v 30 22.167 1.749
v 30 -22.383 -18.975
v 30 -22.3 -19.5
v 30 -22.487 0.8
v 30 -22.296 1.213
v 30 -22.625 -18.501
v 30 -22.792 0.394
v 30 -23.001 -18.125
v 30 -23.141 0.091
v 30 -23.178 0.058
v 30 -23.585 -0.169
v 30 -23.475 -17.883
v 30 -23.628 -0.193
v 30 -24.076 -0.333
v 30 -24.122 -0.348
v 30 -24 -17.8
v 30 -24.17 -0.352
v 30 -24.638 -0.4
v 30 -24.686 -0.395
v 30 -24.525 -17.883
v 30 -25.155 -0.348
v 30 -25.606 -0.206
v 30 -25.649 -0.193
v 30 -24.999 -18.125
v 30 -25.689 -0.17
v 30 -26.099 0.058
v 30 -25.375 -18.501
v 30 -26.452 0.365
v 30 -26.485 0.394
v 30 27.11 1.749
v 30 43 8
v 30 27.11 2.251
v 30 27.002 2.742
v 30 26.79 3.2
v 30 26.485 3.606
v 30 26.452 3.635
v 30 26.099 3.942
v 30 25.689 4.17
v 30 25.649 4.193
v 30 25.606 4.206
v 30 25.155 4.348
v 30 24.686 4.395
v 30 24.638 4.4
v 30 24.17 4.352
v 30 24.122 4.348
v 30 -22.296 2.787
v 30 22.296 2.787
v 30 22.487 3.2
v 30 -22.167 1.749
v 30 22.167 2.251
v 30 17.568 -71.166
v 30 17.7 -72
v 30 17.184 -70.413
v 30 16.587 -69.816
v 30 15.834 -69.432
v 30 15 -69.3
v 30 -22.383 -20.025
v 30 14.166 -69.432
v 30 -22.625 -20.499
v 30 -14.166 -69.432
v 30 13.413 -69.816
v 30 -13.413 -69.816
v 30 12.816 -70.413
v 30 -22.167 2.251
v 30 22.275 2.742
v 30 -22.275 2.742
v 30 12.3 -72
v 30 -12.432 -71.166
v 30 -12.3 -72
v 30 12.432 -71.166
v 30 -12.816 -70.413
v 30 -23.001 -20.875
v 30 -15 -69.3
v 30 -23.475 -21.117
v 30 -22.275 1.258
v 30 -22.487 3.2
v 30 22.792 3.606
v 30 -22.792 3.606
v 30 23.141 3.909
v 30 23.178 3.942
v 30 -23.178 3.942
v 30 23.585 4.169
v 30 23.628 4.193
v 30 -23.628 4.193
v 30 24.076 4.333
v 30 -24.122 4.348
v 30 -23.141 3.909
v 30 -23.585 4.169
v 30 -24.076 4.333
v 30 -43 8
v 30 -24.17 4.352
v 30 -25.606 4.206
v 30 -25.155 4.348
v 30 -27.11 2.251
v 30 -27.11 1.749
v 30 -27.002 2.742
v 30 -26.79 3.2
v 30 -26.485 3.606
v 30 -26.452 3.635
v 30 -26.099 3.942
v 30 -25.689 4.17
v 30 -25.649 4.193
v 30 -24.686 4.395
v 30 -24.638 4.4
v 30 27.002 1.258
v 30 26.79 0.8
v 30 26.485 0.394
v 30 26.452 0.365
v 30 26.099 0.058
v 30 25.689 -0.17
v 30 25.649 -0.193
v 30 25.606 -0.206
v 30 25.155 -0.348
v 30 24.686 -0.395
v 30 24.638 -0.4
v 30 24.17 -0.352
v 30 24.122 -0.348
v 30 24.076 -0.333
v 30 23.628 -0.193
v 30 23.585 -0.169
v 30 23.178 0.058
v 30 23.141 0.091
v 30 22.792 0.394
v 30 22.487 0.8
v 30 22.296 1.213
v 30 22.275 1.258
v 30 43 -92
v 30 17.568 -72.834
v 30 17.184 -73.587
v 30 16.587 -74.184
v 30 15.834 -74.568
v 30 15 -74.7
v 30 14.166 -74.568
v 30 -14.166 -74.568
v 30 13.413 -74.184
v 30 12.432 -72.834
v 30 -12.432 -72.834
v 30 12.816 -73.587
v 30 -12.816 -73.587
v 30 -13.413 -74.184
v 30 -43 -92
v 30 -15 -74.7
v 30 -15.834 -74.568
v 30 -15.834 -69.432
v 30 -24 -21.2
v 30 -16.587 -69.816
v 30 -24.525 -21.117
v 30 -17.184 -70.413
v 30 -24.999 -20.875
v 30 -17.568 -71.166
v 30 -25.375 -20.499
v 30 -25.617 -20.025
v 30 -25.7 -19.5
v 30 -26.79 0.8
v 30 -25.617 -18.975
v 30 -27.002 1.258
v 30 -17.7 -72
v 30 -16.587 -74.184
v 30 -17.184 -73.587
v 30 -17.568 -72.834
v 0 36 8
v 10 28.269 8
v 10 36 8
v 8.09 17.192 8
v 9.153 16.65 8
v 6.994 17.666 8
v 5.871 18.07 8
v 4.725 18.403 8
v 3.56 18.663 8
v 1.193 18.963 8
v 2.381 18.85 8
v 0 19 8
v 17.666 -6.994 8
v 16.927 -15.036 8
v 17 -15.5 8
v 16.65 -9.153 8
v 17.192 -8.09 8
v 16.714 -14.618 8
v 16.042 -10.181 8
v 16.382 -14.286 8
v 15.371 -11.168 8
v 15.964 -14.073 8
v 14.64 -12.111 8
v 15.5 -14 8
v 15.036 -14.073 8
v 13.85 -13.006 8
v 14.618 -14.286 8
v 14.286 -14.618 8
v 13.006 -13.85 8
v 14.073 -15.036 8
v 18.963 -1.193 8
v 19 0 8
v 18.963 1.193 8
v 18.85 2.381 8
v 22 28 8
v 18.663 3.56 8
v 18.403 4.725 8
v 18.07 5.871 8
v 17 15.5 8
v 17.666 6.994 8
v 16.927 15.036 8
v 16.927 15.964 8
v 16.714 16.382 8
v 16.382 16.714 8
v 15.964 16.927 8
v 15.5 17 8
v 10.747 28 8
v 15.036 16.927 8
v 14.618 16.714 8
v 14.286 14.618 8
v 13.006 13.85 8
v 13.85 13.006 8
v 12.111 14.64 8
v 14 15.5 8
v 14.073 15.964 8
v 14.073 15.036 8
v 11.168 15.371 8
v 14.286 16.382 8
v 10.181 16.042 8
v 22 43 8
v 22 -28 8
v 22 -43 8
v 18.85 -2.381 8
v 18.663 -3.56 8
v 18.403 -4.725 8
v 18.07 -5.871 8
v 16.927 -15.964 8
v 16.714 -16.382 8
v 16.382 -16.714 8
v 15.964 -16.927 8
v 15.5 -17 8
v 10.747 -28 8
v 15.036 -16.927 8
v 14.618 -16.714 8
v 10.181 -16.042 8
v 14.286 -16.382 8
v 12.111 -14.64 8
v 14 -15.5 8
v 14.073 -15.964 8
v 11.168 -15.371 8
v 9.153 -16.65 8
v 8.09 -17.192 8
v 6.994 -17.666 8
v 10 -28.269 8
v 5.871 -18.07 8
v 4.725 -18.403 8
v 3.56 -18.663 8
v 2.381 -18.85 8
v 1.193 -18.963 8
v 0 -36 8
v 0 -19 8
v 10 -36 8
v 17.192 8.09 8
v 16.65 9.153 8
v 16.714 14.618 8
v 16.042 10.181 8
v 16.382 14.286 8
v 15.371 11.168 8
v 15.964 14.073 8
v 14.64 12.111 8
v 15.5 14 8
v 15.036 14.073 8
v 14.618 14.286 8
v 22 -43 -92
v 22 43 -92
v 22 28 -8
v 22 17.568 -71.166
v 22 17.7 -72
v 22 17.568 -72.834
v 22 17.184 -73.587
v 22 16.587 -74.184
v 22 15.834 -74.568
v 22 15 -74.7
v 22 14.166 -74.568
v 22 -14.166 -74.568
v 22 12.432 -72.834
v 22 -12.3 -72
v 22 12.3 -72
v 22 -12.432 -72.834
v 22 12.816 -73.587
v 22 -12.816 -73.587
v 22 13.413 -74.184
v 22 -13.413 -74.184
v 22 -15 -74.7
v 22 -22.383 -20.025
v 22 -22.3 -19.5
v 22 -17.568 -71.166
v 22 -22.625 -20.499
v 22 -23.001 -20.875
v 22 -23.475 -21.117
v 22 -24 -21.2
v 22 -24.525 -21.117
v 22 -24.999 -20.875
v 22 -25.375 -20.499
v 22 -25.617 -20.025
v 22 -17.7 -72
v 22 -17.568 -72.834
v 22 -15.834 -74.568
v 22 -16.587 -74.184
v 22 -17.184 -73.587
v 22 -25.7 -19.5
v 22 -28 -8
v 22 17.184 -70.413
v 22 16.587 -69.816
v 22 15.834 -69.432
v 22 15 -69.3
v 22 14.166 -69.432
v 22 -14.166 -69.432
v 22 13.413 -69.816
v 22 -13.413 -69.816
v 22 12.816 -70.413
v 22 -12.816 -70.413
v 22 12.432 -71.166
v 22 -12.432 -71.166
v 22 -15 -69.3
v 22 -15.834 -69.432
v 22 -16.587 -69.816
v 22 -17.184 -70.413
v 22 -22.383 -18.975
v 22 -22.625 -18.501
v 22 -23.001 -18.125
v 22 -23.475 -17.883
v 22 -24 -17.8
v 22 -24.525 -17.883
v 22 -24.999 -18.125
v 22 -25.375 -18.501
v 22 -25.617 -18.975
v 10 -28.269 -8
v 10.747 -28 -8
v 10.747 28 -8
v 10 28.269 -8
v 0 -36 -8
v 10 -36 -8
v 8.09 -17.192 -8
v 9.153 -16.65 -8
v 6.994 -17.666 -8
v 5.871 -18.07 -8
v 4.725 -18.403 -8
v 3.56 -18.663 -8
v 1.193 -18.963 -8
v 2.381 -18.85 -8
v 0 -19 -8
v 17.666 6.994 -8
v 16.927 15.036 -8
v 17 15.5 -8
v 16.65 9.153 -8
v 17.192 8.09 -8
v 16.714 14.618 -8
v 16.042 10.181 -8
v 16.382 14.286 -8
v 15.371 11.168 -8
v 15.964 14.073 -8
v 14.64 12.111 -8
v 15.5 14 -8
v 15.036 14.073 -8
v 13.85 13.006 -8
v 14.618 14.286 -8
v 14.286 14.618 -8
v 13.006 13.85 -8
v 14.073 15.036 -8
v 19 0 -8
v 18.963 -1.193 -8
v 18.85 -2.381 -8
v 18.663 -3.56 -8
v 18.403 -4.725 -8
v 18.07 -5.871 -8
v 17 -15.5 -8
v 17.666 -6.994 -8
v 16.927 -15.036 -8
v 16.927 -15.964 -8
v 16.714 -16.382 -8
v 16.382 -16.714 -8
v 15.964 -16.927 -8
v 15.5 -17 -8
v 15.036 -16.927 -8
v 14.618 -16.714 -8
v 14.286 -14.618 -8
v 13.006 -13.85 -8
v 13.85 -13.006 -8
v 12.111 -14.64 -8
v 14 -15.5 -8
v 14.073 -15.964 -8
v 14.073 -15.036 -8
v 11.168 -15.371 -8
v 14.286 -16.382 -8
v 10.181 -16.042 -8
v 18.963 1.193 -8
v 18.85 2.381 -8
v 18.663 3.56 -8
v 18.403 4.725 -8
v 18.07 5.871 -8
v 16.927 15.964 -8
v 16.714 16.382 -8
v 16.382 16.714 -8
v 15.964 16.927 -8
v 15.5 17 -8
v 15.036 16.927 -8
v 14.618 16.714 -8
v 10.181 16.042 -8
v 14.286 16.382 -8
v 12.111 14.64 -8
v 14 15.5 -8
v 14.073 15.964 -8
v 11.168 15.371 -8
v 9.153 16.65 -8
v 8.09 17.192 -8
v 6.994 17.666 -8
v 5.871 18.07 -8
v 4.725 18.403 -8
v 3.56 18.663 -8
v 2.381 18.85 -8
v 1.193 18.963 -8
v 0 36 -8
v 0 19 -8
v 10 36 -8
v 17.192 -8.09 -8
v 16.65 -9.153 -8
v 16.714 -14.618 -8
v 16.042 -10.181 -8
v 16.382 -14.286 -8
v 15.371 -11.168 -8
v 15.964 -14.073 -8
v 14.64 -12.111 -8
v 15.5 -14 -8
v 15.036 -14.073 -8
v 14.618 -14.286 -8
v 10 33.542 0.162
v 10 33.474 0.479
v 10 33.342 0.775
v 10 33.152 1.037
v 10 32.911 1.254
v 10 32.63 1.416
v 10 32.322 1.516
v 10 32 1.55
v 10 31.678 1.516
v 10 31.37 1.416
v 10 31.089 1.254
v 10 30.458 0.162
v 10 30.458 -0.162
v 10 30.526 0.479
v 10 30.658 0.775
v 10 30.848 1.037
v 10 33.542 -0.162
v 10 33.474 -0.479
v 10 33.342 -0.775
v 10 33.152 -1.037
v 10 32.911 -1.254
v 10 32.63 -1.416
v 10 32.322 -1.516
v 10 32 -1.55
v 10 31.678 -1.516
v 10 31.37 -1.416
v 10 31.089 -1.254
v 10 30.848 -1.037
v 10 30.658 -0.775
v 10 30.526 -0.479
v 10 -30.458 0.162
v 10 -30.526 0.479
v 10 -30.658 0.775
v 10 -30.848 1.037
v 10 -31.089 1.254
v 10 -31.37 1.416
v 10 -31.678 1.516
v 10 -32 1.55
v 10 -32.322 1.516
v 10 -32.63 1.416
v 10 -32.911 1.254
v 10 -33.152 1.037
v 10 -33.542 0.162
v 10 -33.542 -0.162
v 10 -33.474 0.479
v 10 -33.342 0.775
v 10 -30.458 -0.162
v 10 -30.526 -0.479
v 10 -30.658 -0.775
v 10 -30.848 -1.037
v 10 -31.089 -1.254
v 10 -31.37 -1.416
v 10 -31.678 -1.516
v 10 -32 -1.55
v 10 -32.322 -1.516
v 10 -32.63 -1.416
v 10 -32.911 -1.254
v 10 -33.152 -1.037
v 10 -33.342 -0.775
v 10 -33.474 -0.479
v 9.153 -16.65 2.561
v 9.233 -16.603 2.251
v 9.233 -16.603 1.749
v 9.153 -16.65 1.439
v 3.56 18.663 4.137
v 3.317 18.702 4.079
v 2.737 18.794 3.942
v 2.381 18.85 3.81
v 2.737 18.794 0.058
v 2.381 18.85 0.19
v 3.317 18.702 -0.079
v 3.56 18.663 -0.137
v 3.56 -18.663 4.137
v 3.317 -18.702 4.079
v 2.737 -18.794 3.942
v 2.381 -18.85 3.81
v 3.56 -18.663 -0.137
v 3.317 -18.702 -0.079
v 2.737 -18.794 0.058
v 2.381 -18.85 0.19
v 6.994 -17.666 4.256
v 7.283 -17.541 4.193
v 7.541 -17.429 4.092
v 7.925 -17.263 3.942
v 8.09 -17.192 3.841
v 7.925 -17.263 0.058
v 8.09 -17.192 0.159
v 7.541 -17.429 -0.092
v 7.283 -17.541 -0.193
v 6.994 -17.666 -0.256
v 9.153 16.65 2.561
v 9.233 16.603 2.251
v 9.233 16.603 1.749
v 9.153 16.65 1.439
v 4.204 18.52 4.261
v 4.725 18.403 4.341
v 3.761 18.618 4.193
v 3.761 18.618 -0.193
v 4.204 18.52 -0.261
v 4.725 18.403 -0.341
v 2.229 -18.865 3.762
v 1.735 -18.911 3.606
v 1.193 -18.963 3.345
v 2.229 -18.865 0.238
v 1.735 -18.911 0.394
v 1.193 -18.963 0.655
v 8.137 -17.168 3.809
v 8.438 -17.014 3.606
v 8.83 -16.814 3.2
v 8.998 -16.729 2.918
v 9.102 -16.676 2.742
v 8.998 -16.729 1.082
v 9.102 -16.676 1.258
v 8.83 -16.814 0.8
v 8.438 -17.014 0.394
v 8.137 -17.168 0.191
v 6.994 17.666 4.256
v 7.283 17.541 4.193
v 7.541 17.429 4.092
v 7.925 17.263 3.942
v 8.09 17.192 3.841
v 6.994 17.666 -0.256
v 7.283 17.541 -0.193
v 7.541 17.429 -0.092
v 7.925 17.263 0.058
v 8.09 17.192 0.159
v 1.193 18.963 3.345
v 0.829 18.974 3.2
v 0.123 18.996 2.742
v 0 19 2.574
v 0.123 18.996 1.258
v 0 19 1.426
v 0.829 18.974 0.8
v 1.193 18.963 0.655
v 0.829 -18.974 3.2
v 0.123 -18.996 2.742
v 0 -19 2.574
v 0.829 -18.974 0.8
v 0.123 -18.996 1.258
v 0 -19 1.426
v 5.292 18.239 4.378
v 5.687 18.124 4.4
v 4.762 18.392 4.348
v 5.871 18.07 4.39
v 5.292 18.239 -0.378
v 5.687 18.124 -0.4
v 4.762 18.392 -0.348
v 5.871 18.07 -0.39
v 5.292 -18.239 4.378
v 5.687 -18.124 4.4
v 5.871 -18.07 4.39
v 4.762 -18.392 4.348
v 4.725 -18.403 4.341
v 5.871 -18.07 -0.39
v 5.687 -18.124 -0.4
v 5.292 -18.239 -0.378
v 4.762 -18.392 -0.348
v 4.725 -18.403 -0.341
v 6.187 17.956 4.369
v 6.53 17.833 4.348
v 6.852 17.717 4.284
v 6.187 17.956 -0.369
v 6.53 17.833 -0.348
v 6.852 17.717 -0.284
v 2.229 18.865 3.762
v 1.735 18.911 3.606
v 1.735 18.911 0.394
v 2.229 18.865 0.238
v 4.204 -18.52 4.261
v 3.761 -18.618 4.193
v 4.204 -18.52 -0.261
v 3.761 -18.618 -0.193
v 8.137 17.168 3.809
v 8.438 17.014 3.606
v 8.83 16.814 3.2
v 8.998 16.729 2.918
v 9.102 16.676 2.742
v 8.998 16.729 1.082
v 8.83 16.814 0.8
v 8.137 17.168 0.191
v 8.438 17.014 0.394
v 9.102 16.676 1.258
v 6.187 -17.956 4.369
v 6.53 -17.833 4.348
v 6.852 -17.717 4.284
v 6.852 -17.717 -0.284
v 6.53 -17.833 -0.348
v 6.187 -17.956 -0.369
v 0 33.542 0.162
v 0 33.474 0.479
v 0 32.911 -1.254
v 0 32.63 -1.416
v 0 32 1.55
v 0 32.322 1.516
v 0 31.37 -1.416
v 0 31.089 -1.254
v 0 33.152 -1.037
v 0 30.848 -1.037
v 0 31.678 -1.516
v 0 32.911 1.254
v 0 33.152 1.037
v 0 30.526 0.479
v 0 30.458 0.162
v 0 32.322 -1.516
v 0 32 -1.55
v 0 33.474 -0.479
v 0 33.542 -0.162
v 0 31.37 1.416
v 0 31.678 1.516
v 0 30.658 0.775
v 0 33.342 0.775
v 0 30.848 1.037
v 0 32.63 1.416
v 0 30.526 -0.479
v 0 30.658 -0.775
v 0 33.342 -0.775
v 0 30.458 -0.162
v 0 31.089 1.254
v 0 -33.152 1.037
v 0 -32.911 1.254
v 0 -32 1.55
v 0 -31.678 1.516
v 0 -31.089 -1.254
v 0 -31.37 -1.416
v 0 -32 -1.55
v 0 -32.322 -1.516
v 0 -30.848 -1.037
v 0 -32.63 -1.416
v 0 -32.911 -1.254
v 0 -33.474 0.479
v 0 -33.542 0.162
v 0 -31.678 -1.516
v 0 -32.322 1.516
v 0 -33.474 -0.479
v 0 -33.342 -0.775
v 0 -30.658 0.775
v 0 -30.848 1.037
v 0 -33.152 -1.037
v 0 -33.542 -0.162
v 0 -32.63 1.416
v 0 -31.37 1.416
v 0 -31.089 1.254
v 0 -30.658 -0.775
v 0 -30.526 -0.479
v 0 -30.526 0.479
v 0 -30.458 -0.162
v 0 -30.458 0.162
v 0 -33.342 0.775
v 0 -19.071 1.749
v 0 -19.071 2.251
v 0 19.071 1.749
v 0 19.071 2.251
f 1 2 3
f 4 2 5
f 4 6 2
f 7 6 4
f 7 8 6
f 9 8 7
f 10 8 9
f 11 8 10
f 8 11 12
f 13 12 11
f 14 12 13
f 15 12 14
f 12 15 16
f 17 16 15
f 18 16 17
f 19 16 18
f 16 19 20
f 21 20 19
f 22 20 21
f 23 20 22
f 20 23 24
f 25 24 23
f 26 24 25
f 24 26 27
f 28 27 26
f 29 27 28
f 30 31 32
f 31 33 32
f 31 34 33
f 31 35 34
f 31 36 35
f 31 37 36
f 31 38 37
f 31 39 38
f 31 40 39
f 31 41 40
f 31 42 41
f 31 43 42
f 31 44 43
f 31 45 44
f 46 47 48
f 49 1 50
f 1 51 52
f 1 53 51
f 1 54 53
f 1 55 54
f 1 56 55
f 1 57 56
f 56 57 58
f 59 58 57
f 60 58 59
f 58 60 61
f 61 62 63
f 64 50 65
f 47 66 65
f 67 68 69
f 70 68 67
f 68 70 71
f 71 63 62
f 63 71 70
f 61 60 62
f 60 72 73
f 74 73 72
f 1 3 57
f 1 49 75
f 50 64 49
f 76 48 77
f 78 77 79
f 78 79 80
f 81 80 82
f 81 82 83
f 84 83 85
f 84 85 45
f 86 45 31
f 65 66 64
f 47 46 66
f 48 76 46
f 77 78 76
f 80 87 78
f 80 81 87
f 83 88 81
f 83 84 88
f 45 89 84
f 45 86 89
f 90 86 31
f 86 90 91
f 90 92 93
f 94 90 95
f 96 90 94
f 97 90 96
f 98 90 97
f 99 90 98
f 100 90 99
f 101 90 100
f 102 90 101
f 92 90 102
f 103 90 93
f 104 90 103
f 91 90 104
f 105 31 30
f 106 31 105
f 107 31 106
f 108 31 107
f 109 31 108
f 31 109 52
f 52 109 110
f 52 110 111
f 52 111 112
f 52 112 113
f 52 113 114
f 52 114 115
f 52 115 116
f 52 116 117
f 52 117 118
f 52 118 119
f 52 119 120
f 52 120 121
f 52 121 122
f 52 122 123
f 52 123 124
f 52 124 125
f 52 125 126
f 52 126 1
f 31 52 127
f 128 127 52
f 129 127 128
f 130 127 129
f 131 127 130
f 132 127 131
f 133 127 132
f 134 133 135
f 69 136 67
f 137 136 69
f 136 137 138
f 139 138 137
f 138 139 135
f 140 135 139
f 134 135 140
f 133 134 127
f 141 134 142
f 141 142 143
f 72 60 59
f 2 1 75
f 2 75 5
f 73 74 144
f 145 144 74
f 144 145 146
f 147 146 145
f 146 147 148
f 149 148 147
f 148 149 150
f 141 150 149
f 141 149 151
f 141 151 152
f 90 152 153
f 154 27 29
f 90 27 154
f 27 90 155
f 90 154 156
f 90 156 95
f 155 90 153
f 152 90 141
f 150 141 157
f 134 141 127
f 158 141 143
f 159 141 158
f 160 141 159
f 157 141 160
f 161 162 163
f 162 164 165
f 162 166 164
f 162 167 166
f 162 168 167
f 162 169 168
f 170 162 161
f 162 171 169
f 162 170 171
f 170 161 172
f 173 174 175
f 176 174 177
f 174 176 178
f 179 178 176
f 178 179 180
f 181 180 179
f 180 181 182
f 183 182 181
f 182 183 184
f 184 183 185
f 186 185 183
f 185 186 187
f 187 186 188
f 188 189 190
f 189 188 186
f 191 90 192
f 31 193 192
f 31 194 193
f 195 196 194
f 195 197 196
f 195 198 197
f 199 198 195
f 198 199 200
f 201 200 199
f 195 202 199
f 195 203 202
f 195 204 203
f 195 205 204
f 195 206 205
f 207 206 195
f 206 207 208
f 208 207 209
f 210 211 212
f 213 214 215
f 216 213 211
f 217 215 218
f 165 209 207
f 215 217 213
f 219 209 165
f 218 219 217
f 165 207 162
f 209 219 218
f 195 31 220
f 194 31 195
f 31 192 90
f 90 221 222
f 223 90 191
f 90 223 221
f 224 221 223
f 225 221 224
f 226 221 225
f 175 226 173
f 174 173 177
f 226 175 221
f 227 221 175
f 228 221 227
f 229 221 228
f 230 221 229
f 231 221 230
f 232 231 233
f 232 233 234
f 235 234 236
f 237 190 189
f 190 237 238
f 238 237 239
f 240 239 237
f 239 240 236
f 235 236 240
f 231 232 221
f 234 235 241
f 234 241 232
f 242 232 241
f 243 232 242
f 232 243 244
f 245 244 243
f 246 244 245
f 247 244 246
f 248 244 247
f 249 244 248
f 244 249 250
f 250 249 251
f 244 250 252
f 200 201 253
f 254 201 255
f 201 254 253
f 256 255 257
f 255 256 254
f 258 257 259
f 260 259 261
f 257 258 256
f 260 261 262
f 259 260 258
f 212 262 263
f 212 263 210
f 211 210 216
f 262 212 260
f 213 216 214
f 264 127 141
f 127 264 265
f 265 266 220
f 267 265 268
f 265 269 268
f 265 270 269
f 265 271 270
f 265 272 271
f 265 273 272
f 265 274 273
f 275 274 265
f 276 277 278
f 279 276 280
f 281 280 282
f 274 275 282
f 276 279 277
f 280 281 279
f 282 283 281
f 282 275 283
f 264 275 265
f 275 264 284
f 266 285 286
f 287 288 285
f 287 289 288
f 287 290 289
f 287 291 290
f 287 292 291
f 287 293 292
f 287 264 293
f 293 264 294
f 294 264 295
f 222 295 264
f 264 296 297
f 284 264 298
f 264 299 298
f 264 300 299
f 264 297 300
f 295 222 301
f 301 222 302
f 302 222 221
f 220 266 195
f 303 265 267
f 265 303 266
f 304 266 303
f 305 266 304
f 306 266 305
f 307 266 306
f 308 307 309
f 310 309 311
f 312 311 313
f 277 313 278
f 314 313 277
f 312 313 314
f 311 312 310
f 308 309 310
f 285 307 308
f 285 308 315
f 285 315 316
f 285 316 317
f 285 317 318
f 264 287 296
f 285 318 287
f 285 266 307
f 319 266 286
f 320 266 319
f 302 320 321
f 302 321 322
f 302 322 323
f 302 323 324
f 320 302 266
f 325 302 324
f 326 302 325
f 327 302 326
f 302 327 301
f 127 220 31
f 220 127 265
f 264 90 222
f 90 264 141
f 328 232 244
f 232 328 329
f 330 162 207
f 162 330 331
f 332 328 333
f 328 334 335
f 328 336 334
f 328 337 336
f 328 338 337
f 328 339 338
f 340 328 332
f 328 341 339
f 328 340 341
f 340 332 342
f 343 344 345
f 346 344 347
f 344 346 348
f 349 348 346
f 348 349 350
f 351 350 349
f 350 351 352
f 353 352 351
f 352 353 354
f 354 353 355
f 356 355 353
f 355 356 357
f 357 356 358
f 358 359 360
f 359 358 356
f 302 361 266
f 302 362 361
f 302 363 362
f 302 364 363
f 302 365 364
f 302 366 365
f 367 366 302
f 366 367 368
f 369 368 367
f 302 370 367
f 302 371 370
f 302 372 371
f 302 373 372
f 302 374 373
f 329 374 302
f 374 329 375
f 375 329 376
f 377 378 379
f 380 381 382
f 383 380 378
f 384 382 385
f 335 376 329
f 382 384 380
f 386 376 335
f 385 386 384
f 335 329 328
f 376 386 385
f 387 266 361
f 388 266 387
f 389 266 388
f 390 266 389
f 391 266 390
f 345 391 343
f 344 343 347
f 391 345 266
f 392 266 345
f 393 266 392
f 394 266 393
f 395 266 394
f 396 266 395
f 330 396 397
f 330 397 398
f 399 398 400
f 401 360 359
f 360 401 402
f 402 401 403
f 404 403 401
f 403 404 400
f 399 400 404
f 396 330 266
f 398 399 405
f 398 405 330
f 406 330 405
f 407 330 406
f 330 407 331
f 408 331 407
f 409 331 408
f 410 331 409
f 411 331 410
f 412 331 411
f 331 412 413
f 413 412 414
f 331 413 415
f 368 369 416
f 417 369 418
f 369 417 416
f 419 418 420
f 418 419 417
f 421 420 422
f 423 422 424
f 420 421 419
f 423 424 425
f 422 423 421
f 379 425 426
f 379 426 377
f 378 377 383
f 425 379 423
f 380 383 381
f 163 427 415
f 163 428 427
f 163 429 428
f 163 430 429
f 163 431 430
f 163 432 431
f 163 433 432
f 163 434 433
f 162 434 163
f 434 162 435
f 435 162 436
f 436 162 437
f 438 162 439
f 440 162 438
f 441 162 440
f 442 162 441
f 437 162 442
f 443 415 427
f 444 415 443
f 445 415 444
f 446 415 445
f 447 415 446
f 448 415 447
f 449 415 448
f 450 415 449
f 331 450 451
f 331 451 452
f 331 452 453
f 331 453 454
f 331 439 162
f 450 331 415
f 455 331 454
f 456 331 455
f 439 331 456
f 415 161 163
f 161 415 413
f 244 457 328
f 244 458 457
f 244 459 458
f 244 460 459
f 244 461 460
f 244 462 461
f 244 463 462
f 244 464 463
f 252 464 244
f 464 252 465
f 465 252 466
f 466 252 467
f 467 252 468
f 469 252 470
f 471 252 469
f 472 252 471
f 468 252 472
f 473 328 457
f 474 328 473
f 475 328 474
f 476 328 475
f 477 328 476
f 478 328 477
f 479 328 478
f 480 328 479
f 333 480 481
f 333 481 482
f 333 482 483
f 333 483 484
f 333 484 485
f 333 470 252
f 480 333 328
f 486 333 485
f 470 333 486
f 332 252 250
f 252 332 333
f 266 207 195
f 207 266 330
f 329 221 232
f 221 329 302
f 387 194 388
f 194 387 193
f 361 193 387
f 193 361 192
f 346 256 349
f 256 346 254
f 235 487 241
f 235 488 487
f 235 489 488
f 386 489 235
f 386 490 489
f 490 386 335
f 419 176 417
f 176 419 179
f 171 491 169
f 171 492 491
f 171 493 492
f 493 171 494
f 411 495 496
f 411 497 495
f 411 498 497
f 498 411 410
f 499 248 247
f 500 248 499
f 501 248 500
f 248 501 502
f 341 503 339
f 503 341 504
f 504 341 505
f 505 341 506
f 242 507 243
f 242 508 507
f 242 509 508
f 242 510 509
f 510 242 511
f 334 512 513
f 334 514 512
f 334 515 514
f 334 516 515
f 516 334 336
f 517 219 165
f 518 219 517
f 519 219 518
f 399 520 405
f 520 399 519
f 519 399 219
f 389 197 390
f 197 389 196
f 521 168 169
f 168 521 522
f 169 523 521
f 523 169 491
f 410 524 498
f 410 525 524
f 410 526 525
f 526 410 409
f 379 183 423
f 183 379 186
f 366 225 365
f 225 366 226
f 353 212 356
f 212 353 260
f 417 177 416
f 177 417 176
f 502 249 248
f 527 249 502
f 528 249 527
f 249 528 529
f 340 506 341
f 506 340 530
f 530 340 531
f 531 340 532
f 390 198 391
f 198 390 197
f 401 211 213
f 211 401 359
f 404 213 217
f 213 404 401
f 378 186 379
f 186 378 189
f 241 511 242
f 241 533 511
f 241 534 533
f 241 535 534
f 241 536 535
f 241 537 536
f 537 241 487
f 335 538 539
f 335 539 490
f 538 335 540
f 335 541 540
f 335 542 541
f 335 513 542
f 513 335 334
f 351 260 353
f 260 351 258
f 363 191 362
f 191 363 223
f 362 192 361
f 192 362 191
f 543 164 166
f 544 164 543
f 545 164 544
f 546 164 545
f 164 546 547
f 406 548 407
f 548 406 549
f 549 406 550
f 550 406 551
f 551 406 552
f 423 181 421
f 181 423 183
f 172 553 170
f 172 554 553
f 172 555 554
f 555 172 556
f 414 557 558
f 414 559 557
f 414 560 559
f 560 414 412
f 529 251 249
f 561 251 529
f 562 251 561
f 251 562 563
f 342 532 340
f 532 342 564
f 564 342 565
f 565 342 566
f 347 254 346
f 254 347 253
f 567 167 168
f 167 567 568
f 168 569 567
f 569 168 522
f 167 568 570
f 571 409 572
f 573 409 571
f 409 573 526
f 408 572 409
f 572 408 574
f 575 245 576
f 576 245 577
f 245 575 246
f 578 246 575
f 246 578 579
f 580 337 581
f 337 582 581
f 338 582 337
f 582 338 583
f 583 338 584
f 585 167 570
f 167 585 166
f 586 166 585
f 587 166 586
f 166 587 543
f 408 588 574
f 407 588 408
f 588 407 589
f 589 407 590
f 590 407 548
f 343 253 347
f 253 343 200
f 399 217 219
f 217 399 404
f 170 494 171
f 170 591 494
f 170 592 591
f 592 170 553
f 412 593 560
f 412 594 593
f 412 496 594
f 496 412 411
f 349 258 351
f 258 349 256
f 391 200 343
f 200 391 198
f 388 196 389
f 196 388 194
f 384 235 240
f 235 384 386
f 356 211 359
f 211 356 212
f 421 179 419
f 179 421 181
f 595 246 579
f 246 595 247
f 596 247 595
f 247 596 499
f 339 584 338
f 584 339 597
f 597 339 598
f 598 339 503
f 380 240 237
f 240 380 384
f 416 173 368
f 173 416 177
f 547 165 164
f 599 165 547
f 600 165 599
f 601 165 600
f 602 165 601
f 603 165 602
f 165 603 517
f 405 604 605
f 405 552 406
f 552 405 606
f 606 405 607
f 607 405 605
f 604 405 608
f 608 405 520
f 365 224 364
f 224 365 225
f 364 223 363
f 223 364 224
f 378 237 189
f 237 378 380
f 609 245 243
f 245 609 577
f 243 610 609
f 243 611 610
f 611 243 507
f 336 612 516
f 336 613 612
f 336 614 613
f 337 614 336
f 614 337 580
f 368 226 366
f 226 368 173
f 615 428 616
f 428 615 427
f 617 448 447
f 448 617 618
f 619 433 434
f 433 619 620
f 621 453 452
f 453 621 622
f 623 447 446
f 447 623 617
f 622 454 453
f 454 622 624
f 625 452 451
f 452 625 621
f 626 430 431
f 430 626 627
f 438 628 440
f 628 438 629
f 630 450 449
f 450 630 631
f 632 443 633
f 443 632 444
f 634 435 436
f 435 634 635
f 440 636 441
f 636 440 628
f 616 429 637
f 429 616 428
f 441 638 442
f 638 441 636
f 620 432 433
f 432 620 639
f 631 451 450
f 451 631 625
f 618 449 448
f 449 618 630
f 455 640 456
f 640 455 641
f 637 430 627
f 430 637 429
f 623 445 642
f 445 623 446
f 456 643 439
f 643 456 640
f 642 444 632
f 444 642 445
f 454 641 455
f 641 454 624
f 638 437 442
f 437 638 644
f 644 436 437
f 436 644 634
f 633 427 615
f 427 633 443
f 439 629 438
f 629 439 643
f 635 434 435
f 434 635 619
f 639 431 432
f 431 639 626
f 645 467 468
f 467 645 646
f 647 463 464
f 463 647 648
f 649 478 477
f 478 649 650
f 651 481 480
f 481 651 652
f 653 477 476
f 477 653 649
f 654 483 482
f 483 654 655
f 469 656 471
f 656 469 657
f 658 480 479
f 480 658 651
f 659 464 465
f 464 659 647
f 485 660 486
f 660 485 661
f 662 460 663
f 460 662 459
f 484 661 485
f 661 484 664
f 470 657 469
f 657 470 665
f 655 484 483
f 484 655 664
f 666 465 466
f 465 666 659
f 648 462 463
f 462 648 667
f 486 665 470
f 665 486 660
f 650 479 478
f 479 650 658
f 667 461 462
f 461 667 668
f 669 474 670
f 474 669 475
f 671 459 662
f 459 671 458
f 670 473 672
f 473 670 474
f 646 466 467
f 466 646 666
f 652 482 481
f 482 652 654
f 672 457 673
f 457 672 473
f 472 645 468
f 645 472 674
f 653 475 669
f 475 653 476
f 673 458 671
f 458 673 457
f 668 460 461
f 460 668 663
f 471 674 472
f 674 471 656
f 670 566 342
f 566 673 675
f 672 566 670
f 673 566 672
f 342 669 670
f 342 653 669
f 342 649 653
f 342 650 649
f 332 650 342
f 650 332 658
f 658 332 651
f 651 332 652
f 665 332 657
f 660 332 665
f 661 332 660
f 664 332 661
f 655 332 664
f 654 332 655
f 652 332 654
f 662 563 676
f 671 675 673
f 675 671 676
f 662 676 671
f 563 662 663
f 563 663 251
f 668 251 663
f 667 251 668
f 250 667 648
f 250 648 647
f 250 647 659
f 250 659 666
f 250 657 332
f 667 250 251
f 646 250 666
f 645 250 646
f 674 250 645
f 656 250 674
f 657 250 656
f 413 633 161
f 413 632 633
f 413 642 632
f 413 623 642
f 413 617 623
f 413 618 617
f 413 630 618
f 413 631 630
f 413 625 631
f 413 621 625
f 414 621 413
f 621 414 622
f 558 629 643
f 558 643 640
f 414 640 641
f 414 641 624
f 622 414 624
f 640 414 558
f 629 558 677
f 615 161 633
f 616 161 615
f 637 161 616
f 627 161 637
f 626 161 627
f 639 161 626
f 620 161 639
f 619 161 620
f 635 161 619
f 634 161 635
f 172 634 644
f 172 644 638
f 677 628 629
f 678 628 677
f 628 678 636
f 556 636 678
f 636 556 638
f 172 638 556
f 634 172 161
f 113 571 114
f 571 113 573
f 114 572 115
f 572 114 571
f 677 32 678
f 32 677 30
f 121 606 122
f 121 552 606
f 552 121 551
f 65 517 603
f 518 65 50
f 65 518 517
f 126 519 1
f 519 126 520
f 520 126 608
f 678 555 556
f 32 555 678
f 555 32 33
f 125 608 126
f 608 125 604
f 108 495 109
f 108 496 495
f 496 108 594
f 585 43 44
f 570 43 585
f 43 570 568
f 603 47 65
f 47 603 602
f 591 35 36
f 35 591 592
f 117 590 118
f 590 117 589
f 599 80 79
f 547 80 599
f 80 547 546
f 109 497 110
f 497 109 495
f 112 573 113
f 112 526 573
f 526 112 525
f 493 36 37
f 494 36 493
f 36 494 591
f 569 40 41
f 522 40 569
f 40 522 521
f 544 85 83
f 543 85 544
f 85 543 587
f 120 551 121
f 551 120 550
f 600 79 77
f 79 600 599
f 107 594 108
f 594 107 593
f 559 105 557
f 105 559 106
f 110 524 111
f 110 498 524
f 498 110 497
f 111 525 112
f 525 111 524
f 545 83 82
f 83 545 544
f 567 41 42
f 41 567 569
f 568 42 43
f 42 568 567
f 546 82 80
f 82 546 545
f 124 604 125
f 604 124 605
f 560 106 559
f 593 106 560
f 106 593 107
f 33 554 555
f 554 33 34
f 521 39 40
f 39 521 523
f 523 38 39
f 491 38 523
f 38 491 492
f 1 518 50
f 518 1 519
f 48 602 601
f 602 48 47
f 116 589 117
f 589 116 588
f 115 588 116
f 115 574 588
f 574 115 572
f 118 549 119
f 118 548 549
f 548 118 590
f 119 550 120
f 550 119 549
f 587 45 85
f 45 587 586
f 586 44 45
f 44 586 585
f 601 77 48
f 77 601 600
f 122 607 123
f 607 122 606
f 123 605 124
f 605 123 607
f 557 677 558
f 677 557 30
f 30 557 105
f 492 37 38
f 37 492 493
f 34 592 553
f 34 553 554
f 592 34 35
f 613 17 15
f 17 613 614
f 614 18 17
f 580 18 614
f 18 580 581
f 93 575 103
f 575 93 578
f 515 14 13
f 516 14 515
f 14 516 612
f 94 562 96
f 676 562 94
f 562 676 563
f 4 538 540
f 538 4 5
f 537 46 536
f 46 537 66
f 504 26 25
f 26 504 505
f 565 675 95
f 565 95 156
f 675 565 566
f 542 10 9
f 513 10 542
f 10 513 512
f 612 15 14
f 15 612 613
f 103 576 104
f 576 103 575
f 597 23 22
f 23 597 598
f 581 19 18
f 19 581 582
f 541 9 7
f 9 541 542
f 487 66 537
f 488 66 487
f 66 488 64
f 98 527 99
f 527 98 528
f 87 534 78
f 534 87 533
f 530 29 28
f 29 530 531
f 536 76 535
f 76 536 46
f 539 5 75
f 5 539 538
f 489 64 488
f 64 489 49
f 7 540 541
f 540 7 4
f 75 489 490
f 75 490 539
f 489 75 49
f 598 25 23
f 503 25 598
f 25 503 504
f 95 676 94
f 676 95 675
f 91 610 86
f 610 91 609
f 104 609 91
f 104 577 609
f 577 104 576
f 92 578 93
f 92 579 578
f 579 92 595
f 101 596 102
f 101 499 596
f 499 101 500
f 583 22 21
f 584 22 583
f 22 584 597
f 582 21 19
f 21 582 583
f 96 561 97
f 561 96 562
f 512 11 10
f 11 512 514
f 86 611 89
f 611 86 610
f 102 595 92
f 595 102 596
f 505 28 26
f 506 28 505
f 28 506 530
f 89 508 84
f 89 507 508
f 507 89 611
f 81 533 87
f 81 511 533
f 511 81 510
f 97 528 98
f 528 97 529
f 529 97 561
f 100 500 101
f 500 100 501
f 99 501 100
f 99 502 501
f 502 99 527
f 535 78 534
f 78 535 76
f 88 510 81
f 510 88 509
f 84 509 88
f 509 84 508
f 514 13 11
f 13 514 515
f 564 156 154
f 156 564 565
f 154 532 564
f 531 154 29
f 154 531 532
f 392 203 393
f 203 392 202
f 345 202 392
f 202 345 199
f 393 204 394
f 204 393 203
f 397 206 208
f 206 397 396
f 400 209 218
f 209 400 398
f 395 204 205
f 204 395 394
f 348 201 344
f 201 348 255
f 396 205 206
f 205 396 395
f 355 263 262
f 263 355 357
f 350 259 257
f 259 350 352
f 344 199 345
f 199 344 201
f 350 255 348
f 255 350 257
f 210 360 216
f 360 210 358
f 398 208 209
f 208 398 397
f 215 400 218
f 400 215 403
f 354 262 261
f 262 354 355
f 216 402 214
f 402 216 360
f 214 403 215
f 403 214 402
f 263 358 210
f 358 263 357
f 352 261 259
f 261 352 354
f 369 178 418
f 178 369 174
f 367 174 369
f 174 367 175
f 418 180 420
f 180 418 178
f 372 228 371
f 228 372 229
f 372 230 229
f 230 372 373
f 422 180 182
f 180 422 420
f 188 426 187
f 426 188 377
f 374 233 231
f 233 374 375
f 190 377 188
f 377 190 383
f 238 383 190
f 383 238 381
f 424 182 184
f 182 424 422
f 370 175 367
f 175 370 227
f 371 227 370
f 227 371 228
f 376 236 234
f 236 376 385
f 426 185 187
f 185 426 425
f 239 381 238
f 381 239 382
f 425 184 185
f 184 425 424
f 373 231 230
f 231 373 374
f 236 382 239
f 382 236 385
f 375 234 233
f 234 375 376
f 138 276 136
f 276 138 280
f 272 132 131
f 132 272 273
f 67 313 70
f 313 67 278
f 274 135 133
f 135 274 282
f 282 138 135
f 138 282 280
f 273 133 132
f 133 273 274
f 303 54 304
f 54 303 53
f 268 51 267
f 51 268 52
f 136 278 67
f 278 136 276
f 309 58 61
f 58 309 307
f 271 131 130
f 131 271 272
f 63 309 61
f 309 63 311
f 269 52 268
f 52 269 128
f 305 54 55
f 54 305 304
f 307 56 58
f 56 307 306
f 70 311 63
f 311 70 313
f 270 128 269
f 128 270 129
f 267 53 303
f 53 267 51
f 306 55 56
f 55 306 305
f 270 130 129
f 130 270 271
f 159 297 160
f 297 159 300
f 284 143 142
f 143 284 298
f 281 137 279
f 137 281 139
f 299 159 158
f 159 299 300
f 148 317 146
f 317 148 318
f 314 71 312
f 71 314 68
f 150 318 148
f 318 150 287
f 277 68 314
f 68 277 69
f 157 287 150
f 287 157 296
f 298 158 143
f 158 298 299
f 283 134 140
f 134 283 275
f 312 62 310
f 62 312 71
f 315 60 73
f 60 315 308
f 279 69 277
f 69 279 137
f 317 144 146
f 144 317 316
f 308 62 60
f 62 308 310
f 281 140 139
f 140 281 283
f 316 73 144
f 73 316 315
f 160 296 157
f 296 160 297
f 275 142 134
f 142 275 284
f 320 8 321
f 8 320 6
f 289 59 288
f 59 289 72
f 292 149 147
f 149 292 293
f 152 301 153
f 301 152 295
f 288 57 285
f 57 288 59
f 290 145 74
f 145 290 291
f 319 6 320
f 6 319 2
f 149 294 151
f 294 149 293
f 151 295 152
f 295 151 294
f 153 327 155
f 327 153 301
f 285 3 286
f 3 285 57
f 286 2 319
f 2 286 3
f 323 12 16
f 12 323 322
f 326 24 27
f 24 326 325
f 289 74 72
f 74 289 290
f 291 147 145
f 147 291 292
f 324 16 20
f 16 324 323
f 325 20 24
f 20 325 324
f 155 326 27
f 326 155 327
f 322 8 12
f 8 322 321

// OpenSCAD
/*dimensioni base*/
larghezzab=86;
lunghezzab=100;
altezzab=8;
raggioviti=2.7;
heightpump=16;
radiusoutcyl=25;
radiushole=15;
radiusholebig=19;
radiusoutcylbig=30;
heightscrewcube=20;
widthscrewcube=22;
screwdistancefromborder=4;
tuberadius=2.4;
tubeposition=2;
skirtthickness=3;
skirtradius=radiushole-2;
screwradius=1.55;
separazione=-10;
enterangle=35;
altezzarett=22;
larghezzarett=10;


difference(){

 
union(){

translate([radiusoutcylbig-altezzab/2,0,-(lunghezzab/2-heightpump/2)])cube([altezzab,larghezzab,lunghezzab],true);


color("green") cylinder(h=heightpump,r=radiusoutcylbig,center=true,$fn=100);
color ("blue") translate ([0,radiusoutcyl,0]) cube([heightscrewcube,widthscrewcube,heightpump],true);
color ("blue") translate ([0,-radiusoutcyl,0]) cube([heightscrewcube,widthscrewcube,heightpump],true);

translate([11,23,0]) cube([altezzarett,larghezzarett,heightpump],true);
mirror([0,1,0]){
    translate([11,23,0]) cube([altezzarett,larghezzarett,heightpump],true);
    }
}
color("red") cylinder(h=heightpump+10,r=radiusholebig,center=true,$fn=100);
translate([0,radiusoutcyl+widthscrewcube/2-screwdistancefromborder,0]) rotate([0,90,0]) cylinder(h=heightscrewcube+10,r=screwradius,$fn=30,center=true);
translate([0,-(radiusoutcyl+(widthscrewcube/2-screwdistancefromborder)),0]) rotate([0,90,0]) cylinder(h=heightscrewcube+10,r=screwradius,$fn=30,center=true);
translate([-radiusoutcylbig/2,0,0]) cube([radiusoutcylbig,radiusoutcylbig*2+heightscrewcube+20,heightpump+20],center=true);
translate([0,radiusholebig-tuberadius,tubeposition]) rotate([0,90,15]) cylinder(h=radiusholebig*4,r=tuberadius,$fn=30,center=true);
translate([0,-radiusholebig+tuberadius,tubeposition]) rotate([0,90,-15]) cylinder(h=radiusholebig*4,r=tuberadius,$fn=30,center=true);
translate([15.5,15.5,0]) cylinder(h=60,r=1.5,center=true,$fn=20);
translate([15.5,-15.5,0]) cylinder(h=60,r=1.5,center=true,$fn=20);

/*fori per le viti posteriori, distanza dal fondo=4,5cm, raggio foro=2.5, distanza tra i fori 6,6cm */

rotate([0,90,0]) translate([(lunghezzab-heightpump/2-20),15,24]) cylinder(h=12,r=raggioviti,$fn=20,center=true);

mirror([0,1,0]){
rotate([0,90,0]) translate([(lunghezzab-heightpump/2-20),15,radiusoutcylbig-altezzab/2]) #cylinder(h=12,r=raggioviti,$fn=20,center=true);
        }
rotate([0,90,0]) translate([(19.5),-24,24]) cylinder(h=12,r=1.7,$fn=20,center=true);
}
